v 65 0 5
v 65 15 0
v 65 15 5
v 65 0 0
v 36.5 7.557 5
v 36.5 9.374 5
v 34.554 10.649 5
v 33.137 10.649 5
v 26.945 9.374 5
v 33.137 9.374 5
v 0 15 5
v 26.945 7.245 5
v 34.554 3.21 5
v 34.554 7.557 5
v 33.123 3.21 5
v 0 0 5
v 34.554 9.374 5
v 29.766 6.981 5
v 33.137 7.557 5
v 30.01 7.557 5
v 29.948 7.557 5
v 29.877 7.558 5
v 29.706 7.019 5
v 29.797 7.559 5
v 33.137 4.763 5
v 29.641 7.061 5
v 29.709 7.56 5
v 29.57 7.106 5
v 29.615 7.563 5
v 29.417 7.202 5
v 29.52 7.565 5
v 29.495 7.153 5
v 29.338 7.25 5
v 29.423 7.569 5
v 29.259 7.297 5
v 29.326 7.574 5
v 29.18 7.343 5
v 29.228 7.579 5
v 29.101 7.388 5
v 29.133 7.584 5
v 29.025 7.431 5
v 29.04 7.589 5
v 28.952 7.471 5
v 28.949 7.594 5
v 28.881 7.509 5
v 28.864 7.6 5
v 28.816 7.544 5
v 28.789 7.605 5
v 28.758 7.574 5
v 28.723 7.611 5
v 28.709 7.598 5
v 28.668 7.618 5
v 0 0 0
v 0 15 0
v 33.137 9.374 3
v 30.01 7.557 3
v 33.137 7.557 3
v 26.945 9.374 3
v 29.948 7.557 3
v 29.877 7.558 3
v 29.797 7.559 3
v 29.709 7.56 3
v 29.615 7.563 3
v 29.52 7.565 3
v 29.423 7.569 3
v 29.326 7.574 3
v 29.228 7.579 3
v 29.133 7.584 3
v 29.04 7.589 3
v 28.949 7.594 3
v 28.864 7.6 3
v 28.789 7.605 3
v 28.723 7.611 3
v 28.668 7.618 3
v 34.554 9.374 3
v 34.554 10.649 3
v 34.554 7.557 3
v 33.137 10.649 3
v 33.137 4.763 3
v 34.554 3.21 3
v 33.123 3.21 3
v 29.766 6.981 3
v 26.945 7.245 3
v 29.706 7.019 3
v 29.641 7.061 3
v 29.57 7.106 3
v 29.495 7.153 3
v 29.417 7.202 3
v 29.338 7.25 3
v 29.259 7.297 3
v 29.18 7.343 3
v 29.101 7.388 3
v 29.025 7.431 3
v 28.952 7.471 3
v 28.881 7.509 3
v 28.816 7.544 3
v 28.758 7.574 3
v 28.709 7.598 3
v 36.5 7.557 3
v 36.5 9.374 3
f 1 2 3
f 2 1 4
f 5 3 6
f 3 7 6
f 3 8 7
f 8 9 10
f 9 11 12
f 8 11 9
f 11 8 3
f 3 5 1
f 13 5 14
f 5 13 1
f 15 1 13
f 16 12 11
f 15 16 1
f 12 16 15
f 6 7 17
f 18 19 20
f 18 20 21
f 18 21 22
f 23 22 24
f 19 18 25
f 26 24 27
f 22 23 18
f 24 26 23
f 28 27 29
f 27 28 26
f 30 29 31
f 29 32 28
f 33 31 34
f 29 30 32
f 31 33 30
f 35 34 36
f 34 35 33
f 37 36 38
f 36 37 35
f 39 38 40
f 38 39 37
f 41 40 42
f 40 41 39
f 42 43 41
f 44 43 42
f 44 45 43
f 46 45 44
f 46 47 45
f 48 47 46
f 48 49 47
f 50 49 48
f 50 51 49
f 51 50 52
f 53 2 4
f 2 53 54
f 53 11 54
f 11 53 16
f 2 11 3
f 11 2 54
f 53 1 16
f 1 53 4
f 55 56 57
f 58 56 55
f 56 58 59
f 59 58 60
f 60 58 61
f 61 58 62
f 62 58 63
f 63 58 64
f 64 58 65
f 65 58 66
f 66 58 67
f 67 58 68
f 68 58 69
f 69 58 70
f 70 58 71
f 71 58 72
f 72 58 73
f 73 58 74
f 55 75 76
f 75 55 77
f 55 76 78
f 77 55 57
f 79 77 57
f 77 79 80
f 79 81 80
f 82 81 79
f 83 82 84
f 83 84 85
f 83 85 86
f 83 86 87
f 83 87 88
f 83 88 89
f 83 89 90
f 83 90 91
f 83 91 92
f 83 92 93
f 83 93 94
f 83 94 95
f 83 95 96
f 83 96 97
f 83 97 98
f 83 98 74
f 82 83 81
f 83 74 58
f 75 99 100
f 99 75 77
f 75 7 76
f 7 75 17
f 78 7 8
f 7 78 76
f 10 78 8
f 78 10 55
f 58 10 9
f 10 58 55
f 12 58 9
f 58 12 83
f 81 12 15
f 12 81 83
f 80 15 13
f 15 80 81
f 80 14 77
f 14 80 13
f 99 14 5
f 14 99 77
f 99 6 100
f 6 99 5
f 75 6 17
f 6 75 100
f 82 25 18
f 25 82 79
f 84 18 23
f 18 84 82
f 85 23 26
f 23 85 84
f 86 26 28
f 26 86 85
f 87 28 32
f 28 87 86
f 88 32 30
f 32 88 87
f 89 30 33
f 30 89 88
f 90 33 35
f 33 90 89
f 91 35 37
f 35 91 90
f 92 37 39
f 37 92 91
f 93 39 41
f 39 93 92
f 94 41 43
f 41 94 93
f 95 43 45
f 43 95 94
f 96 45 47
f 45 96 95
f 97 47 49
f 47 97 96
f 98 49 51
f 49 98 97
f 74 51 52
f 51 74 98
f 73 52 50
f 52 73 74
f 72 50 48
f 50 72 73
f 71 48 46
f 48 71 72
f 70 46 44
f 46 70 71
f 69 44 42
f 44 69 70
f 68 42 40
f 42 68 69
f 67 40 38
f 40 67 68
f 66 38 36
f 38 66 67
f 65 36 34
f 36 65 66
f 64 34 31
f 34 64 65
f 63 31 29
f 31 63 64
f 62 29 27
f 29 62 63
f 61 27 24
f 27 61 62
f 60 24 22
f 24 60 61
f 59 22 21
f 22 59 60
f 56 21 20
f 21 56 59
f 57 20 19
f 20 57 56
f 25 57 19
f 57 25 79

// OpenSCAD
difference(){
	union(){ 
        translate([0,0,0]){
           cube([65,15,5], center=false);
        }                
	}
	union() {
        translate([60-65/2+9, 3,3]){
            linear_extrude(height = 10) {
                rotate([0,0,90]){
                    text("4", size = 10, font="Arial:style=Bold");
                }
            }
        }                


	}
}
